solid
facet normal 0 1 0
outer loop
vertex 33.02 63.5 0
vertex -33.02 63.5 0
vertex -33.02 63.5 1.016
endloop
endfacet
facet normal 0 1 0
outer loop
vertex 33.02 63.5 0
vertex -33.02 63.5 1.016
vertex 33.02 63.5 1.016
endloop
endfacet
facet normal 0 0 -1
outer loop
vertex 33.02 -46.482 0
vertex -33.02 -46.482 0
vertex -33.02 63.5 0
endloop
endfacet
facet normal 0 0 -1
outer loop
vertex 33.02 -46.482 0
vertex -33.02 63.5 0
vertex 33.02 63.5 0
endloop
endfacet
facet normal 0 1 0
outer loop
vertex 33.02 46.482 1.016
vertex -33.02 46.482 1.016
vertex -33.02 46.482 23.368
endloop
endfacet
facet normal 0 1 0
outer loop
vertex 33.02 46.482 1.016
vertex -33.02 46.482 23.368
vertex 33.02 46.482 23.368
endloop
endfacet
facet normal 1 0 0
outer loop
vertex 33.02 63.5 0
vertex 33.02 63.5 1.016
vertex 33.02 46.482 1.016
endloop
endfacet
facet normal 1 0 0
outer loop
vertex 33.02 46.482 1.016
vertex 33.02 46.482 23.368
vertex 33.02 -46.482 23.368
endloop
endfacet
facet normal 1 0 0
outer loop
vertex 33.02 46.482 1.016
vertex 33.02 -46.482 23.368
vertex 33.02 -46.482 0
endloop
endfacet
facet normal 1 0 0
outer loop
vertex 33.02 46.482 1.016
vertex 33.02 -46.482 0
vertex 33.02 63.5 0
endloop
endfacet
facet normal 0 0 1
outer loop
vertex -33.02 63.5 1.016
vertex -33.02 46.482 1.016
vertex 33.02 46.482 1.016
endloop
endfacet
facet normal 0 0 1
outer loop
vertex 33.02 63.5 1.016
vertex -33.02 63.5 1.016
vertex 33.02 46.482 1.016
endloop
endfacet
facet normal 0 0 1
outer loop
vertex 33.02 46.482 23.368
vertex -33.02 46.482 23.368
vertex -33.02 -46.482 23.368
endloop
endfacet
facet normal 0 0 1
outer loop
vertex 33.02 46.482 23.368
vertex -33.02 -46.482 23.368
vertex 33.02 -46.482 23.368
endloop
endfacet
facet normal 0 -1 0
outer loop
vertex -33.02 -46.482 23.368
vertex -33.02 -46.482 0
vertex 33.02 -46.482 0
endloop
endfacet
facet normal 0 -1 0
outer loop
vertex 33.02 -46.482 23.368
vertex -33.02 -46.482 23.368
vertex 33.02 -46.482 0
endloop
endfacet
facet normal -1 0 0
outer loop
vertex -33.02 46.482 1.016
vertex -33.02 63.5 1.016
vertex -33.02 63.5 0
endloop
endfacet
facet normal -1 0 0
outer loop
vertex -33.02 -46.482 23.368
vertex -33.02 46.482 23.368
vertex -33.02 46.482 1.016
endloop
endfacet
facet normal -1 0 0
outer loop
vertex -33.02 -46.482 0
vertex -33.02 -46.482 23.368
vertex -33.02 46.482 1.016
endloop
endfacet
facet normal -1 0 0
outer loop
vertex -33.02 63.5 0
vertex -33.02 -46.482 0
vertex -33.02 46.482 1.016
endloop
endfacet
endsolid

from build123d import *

# Parameters (mm, degrees)
SKETCH1_W           = 66.04
SKETCH1_H           = 92.964
BOSS_EXTRUDE1_DEPTH = 23.368
SKETCH3_W           = 66.04
SKETCH3_H           = 1.016
BOSS_EXTRUDE2_DEPTH = 17.018


with BuildPart() as part:
    # Sketch1 → Boss-Extrude1 (new body)
    with BuildSketch(Plane.XY):
        Rectangle(SKETCH1_W, SKETCH1_H)
    extrude(amount=BOSS_EXTRUDE1_DEPTH)

    # Sketch3 → Boss-Extrude2 (add)
    with BuildSketch(Plane(origin=(0, 46.482, 0), x_dir=(1, 0, 0), z_dir=(0, 1, 0))):
        with Locations((0, -0.508)):
            Rectangle(SKETCH3_W, SKETCH3_H)
    extrude(amount=BOSS_EXTRUDE2_DEPTH)


solid = part.part
